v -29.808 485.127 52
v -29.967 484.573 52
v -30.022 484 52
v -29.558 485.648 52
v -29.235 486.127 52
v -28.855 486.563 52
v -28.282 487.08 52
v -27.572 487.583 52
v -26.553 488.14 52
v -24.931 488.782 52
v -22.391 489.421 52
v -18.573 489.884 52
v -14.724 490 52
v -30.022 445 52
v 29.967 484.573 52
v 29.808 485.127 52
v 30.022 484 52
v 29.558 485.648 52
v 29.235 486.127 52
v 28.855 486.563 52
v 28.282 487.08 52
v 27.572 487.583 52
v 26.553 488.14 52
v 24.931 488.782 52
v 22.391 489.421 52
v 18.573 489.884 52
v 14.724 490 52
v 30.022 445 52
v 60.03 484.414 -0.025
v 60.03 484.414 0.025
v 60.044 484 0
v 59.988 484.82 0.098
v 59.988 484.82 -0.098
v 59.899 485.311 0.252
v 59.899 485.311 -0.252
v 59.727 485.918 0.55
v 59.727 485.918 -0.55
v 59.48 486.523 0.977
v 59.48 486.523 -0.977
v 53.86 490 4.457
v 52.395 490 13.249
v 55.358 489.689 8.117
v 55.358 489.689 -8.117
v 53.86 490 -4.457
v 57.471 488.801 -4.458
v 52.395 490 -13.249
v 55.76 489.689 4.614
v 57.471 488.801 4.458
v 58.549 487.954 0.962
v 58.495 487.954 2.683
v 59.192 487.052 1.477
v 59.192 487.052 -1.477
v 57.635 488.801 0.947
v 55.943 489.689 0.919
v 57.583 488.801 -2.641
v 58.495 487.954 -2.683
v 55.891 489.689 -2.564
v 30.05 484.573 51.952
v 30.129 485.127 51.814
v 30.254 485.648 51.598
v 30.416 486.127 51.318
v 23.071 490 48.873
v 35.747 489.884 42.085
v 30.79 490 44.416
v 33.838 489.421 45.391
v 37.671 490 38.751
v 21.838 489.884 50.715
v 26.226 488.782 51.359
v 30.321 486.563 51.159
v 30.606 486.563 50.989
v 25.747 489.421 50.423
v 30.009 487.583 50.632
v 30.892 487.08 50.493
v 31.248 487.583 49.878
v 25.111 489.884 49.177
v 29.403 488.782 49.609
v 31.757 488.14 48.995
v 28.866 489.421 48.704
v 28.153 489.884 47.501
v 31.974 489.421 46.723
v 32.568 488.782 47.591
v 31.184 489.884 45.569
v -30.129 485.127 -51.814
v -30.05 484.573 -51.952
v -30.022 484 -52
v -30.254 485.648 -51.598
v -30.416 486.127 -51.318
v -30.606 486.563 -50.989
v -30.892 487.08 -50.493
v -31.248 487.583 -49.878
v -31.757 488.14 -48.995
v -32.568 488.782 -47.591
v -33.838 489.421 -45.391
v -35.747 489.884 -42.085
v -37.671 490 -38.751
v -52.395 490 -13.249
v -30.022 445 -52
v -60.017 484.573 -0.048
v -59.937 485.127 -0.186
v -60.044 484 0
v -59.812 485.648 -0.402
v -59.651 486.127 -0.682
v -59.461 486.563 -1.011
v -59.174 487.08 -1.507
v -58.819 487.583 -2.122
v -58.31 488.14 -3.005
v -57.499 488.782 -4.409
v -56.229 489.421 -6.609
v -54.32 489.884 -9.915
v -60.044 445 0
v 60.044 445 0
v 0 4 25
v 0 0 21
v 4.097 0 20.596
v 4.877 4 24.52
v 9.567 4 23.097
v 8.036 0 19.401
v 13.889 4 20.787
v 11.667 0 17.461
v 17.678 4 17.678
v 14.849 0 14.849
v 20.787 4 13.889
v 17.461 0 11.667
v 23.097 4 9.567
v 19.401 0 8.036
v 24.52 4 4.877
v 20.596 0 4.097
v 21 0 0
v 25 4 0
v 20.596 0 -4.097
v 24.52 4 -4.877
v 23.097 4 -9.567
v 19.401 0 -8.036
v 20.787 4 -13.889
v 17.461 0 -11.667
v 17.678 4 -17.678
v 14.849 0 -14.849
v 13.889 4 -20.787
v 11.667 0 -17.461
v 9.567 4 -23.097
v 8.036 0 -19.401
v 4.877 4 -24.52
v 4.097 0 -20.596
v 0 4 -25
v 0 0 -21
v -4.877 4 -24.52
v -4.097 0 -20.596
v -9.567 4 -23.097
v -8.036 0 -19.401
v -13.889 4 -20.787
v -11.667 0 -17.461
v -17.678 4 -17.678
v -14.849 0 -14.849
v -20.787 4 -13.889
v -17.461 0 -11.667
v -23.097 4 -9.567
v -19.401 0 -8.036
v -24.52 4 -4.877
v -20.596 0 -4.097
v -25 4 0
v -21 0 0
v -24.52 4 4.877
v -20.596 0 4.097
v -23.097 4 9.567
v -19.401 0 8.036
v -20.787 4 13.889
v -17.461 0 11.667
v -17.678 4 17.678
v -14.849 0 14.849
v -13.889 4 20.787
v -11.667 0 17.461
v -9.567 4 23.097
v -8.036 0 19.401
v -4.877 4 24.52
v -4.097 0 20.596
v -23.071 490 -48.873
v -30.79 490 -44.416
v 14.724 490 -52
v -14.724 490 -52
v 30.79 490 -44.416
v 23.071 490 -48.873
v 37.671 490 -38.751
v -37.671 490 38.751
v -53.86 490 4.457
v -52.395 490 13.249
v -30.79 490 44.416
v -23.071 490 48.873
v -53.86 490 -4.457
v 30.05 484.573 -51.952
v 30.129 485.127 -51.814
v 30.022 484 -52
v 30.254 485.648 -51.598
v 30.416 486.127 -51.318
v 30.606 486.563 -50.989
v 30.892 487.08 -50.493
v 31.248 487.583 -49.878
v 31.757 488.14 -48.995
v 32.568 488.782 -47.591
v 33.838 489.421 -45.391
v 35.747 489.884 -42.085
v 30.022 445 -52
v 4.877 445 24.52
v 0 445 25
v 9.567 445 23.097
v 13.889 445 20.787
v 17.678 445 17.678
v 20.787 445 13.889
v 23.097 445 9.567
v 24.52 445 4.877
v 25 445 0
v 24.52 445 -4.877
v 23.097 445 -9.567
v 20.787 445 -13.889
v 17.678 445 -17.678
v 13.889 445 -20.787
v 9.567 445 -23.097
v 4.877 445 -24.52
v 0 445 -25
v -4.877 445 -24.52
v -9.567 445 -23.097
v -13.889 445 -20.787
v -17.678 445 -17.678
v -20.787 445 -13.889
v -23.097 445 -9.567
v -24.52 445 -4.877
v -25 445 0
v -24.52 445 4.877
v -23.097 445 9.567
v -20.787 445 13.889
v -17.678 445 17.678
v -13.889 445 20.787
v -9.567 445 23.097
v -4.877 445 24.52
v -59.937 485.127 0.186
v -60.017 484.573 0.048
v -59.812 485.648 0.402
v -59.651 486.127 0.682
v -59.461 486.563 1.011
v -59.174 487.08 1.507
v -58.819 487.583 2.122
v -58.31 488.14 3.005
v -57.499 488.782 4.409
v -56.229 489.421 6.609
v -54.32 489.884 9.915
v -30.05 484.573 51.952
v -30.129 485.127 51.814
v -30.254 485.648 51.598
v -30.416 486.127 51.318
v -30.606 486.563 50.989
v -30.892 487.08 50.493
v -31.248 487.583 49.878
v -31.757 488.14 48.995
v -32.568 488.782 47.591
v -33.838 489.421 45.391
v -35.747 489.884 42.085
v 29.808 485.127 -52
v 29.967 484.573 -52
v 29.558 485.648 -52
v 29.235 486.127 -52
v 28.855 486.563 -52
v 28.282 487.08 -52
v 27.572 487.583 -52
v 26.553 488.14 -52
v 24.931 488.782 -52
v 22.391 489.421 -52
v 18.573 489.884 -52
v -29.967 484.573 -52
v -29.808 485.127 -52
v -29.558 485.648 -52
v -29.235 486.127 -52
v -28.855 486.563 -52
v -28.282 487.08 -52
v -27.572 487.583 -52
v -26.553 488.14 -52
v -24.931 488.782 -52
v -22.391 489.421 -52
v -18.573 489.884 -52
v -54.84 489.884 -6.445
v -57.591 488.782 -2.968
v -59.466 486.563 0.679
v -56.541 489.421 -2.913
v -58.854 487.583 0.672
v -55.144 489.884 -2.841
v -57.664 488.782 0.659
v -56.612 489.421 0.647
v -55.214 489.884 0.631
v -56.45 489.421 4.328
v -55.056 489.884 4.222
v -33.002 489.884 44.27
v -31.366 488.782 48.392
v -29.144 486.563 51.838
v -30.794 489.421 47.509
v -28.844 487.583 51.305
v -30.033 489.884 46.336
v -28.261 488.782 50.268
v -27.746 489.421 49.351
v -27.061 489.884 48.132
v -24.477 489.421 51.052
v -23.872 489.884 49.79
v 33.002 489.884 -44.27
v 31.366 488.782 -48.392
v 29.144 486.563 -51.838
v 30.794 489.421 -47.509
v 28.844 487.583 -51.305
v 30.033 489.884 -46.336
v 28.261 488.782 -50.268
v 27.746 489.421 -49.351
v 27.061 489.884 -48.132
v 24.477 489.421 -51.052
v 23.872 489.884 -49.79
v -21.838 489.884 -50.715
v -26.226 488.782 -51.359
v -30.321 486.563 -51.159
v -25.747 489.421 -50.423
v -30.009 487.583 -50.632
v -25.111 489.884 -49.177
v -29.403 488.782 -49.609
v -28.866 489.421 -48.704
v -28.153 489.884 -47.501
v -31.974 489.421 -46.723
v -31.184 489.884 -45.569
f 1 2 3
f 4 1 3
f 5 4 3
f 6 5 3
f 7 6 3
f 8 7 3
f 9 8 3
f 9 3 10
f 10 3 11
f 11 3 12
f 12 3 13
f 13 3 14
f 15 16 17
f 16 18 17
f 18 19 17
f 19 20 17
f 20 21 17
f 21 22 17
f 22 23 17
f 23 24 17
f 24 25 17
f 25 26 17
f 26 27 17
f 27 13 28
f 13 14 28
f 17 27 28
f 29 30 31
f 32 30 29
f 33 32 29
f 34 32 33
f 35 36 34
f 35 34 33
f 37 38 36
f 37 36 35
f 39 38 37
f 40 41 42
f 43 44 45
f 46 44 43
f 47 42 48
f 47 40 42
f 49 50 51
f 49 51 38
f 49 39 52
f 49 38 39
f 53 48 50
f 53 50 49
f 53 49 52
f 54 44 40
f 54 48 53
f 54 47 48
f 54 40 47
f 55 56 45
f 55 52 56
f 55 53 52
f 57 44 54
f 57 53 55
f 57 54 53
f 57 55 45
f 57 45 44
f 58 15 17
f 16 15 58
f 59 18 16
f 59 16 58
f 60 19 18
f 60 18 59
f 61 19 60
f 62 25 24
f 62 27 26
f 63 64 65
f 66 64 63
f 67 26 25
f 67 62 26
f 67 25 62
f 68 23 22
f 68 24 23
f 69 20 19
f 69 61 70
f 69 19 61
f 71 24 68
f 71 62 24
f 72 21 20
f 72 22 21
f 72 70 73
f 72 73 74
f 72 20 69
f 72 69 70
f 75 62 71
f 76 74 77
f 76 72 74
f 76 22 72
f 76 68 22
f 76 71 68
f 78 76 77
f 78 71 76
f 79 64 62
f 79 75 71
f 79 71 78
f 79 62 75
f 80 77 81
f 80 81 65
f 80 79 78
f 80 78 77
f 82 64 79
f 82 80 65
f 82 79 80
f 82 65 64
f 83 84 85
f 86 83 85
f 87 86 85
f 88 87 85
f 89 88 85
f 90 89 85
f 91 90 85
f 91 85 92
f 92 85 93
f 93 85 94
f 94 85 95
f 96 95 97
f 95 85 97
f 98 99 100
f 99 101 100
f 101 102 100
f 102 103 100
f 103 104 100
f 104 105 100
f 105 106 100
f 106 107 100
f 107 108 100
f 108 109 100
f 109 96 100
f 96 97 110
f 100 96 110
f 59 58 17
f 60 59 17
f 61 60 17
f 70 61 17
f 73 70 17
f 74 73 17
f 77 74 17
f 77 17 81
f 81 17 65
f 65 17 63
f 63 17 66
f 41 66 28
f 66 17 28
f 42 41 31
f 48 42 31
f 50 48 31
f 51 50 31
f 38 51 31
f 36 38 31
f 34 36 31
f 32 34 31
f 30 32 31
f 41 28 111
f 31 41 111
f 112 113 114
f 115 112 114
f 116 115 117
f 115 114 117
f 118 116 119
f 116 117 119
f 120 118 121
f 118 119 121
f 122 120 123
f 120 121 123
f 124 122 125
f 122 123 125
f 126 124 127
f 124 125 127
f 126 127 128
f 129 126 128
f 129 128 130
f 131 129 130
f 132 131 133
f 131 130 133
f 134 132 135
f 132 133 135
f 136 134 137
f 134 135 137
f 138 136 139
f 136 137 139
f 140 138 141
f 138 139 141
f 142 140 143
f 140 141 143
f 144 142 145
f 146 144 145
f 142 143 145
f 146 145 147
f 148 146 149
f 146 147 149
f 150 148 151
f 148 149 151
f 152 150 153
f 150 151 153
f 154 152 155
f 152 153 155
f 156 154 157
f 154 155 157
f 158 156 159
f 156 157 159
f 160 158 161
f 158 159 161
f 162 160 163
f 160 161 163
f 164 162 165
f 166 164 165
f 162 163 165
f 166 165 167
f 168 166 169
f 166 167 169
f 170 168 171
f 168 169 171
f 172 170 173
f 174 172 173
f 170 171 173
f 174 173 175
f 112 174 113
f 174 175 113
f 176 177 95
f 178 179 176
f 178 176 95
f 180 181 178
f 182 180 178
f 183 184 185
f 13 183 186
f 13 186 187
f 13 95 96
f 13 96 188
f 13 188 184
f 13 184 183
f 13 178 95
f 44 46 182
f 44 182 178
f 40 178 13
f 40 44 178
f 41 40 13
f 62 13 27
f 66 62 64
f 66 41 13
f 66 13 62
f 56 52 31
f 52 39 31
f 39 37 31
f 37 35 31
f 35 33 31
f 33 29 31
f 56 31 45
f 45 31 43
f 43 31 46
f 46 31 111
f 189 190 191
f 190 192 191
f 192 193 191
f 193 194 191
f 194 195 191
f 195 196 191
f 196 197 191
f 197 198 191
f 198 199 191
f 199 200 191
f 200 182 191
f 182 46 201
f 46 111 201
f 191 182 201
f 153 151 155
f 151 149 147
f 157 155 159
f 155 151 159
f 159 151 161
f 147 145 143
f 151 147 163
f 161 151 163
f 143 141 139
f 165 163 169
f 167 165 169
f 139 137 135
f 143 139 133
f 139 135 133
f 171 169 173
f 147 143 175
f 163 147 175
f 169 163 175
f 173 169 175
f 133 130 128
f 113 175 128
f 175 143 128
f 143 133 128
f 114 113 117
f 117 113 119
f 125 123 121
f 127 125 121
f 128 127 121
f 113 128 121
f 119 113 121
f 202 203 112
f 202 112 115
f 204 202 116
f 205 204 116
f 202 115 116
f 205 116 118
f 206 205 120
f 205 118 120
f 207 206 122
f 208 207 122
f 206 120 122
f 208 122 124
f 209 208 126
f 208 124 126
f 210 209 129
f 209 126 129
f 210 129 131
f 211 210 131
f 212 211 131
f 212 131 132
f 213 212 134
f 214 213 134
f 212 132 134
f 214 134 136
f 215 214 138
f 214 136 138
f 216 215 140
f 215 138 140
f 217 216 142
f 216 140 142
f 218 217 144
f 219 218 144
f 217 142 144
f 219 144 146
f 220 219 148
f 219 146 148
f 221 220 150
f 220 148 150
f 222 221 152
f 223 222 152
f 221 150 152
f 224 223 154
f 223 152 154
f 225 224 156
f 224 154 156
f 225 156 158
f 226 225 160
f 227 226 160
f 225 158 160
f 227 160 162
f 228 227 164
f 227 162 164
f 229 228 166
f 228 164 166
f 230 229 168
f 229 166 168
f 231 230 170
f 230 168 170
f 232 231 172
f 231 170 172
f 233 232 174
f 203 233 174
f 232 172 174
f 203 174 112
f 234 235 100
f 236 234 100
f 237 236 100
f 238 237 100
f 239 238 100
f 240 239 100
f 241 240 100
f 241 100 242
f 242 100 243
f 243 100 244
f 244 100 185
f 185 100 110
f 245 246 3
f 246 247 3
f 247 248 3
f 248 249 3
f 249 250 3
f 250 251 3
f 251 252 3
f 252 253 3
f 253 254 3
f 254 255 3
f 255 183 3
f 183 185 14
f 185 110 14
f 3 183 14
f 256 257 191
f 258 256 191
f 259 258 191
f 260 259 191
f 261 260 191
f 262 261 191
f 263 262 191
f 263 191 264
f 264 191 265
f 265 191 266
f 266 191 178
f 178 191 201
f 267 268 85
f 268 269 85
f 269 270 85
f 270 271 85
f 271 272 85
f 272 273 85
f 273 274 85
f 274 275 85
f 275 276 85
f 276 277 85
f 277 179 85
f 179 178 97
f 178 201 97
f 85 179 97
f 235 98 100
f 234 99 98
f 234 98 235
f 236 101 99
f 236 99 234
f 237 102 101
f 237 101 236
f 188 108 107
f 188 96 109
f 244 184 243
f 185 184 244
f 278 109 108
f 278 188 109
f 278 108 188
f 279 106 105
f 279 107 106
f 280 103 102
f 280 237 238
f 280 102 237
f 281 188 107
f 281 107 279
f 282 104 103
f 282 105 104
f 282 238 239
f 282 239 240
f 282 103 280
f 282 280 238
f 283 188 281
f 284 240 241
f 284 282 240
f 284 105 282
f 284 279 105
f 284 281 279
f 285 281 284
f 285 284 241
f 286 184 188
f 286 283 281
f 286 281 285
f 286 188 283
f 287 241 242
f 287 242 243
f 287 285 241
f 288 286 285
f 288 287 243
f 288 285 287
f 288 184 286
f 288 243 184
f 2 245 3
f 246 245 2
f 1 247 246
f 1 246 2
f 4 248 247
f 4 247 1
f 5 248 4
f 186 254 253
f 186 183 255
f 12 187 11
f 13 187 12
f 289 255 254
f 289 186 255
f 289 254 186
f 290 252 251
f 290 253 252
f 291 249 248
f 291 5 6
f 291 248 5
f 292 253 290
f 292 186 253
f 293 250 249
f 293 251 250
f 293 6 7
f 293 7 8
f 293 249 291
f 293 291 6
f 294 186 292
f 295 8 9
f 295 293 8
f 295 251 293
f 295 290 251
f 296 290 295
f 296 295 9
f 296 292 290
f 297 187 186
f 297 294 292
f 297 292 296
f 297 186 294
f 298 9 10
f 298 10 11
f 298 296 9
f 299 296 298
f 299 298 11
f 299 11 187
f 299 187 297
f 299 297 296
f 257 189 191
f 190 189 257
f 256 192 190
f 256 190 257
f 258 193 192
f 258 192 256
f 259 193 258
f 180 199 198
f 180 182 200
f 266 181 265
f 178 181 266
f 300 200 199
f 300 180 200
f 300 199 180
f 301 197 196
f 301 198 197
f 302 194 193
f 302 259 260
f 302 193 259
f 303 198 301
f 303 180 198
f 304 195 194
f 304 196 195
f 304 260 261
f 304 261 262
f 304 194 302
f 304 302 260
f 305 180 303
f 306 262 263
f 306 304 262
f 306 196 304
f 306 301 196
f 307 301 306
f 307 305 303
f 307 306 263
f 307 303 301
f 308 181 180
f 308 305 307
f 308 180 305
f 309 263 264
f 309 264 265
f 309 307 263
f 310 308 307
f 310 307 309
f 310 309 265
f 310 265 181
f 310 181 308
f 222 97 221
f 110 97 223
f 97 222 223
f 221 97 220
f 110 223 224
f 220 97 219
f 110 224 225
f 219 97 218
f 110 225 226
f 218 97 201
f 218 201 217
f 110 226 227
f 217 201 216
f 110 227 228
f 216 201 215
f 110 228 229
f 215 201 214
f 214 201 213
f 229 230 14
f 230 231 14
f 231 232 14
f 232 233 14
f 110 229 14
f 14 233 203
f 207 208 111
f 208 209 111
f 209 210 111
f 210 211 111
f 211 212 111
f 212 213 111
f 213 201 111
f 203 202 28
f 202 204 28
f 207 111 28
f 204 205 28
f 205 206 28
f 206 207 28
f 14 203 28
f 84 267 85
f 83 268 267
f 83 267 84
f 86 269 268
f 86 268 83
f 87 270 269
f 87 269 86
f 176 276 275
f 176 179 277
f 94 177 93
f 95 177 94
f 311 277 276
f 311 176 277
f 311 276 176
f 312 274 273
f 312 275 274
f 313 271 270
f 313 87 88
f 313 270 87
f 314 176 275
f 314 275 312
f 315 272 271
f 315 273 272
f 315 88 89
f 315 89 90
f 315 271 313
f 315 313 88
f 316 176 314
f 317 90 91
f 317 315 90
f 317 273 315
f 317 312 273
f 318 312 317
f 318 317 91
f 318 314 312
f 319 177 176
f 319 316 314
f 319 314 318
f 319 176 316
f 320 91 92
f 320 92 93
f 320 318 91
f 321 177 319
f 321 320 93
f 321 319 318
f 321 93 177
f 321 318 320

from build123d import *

# Parameters (mm, degrees)
SKETCH1_R           = 25
BOSS_EXTRUDE1_DEPTH = 445
SKETCH2_R           = 25
BOSS_EXTRUDE2_DEPTH = 45
CHAMFER1_SIZE       = 4


with BuildPart() as part:
    # Sketch1 → Boss-Extrude1 (new body)
    with BuildSketch(Plane(origin=(0, 0, 0), x_dir=(1, 0, 0), z_dir=(0, 1, 0))):
        with Locations(Location((0, 0, 0), (0, 0, 270))):
            Circle(SKETCH1_R)
    extrude(amount=BOSS_EXTRUDE1_DEPTH)

    # Sketch2 → Boss-Extrude2 (add)
    with BuildSketch(Plane(origin=(0, 445, 0), x_dir=(1, 0, 0), z_dir=(0, 1, 0))):
        with Locations(Location((0, 0, 0), (0, 0, 270))):
            Circle(SKETCH2_R)
        Polygon((-30.022213998, -52), (30.022213998, -52), (60.044427996, 0), (-60.044427996, 0), align=None)
        with BuildLine():
            ThreePointArc((-25, 0), (0, -25), (25, 0))
            Line((25, 0), (-25, 0))
        make_face()
        with BuildLine():
            Line((-25, 0), (25, 0))
            ThreePointArc((25, 0), (0, 25), (-25, 0))
        make_face()
        Polygon((-60.044427996, 0), (60.044427996, 0), (30.022213998, 52), (-30.022213998, 52), align=None)
    extrude(amount=BOSS_EXTRUDE2_DEPTH)

    # Chamfer1
    chamfer1_edges = [part.edges().sort_by_distance(p)[0] for p in [
        (0, 0, -25),
    ]]
    chamfer(chamfer1_edges, length=CHAMFER1_SIZE)

    # Sketch4 → Cut-Revolve1 (revolve, cut)
    with BuildSketch(Plane.XY):
        with BuildLine():
            Line((54.044427996, 490), (54.044427996, 495.946588309))
            Line((54.044427996, 495.946588309), (66.888539308, 495.946588309))
            Line((66.888539308, 495.946588309), (66.888539308, 484))
            Line((66.888539308, 484), (60.044427996, 484))
            ThreePointArc((60.044427996, 484), (58.287068683, 488.242640687), (54.044427996, 490))
        make_face()
    revolve(axis=Axis((0, 0, 0), (0, 1, 0)), mode=Mode.SUBTRACT)


solid = part.part
